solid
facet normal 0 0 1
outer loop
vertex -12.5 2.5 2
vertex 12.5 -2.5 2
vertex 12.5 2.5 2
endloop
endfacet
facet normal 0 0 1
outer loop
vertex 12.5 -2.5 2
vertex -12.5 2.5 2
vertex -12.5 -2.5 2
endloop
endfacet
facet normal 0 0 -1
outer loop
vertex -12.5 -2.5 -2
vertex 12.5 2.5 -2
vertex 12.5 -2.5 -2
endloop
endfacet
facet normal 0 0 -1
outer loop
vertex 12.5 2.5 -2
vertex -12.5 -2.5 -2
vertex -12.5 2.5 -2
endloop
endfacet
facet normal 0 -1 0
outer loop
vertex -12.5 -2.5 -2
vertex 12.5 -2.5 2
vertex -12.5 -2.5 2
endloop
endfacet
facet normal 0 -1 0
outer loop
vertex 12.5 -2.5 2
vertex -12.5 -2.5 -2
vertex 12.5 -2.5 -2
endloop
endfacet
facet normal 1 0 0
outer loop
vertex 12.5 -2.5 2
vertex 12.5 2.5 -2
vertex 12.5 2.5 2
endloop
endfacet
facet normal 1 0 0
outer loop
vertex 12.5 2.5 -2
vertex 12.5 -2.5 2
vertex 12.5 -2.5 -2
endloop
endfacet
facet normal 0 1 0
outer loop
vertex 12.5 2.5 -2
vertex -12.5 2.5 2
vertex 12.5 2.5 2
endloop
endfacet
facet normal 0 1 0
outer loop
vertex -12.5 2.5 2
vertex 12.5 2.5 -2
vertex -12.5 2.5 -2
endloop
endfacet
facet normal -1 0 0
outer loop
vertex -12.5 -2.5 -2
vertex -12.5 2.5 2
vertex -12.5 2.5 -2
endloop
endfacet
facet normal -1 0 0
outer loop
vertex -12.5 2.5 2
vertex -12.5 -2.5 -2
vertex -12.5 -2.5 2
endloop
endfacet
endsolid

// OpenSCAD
// 单位 mm。用户确认总长含刀头；端面对角宽5、对边高4。
// 仅外包络，不是完整六角杆身/十字刀头模型。
// 禁止将此外包络的八个角当作真实零件上可见的 PnP 特征点。
length_mm = 25;
width_mm = 5;
height_mm = 4;
// X: 沿零件长轴；Y/Z: 横截面；原点为外包络中心。
cube([length_mm, width_mm, height_mm], center=true);
